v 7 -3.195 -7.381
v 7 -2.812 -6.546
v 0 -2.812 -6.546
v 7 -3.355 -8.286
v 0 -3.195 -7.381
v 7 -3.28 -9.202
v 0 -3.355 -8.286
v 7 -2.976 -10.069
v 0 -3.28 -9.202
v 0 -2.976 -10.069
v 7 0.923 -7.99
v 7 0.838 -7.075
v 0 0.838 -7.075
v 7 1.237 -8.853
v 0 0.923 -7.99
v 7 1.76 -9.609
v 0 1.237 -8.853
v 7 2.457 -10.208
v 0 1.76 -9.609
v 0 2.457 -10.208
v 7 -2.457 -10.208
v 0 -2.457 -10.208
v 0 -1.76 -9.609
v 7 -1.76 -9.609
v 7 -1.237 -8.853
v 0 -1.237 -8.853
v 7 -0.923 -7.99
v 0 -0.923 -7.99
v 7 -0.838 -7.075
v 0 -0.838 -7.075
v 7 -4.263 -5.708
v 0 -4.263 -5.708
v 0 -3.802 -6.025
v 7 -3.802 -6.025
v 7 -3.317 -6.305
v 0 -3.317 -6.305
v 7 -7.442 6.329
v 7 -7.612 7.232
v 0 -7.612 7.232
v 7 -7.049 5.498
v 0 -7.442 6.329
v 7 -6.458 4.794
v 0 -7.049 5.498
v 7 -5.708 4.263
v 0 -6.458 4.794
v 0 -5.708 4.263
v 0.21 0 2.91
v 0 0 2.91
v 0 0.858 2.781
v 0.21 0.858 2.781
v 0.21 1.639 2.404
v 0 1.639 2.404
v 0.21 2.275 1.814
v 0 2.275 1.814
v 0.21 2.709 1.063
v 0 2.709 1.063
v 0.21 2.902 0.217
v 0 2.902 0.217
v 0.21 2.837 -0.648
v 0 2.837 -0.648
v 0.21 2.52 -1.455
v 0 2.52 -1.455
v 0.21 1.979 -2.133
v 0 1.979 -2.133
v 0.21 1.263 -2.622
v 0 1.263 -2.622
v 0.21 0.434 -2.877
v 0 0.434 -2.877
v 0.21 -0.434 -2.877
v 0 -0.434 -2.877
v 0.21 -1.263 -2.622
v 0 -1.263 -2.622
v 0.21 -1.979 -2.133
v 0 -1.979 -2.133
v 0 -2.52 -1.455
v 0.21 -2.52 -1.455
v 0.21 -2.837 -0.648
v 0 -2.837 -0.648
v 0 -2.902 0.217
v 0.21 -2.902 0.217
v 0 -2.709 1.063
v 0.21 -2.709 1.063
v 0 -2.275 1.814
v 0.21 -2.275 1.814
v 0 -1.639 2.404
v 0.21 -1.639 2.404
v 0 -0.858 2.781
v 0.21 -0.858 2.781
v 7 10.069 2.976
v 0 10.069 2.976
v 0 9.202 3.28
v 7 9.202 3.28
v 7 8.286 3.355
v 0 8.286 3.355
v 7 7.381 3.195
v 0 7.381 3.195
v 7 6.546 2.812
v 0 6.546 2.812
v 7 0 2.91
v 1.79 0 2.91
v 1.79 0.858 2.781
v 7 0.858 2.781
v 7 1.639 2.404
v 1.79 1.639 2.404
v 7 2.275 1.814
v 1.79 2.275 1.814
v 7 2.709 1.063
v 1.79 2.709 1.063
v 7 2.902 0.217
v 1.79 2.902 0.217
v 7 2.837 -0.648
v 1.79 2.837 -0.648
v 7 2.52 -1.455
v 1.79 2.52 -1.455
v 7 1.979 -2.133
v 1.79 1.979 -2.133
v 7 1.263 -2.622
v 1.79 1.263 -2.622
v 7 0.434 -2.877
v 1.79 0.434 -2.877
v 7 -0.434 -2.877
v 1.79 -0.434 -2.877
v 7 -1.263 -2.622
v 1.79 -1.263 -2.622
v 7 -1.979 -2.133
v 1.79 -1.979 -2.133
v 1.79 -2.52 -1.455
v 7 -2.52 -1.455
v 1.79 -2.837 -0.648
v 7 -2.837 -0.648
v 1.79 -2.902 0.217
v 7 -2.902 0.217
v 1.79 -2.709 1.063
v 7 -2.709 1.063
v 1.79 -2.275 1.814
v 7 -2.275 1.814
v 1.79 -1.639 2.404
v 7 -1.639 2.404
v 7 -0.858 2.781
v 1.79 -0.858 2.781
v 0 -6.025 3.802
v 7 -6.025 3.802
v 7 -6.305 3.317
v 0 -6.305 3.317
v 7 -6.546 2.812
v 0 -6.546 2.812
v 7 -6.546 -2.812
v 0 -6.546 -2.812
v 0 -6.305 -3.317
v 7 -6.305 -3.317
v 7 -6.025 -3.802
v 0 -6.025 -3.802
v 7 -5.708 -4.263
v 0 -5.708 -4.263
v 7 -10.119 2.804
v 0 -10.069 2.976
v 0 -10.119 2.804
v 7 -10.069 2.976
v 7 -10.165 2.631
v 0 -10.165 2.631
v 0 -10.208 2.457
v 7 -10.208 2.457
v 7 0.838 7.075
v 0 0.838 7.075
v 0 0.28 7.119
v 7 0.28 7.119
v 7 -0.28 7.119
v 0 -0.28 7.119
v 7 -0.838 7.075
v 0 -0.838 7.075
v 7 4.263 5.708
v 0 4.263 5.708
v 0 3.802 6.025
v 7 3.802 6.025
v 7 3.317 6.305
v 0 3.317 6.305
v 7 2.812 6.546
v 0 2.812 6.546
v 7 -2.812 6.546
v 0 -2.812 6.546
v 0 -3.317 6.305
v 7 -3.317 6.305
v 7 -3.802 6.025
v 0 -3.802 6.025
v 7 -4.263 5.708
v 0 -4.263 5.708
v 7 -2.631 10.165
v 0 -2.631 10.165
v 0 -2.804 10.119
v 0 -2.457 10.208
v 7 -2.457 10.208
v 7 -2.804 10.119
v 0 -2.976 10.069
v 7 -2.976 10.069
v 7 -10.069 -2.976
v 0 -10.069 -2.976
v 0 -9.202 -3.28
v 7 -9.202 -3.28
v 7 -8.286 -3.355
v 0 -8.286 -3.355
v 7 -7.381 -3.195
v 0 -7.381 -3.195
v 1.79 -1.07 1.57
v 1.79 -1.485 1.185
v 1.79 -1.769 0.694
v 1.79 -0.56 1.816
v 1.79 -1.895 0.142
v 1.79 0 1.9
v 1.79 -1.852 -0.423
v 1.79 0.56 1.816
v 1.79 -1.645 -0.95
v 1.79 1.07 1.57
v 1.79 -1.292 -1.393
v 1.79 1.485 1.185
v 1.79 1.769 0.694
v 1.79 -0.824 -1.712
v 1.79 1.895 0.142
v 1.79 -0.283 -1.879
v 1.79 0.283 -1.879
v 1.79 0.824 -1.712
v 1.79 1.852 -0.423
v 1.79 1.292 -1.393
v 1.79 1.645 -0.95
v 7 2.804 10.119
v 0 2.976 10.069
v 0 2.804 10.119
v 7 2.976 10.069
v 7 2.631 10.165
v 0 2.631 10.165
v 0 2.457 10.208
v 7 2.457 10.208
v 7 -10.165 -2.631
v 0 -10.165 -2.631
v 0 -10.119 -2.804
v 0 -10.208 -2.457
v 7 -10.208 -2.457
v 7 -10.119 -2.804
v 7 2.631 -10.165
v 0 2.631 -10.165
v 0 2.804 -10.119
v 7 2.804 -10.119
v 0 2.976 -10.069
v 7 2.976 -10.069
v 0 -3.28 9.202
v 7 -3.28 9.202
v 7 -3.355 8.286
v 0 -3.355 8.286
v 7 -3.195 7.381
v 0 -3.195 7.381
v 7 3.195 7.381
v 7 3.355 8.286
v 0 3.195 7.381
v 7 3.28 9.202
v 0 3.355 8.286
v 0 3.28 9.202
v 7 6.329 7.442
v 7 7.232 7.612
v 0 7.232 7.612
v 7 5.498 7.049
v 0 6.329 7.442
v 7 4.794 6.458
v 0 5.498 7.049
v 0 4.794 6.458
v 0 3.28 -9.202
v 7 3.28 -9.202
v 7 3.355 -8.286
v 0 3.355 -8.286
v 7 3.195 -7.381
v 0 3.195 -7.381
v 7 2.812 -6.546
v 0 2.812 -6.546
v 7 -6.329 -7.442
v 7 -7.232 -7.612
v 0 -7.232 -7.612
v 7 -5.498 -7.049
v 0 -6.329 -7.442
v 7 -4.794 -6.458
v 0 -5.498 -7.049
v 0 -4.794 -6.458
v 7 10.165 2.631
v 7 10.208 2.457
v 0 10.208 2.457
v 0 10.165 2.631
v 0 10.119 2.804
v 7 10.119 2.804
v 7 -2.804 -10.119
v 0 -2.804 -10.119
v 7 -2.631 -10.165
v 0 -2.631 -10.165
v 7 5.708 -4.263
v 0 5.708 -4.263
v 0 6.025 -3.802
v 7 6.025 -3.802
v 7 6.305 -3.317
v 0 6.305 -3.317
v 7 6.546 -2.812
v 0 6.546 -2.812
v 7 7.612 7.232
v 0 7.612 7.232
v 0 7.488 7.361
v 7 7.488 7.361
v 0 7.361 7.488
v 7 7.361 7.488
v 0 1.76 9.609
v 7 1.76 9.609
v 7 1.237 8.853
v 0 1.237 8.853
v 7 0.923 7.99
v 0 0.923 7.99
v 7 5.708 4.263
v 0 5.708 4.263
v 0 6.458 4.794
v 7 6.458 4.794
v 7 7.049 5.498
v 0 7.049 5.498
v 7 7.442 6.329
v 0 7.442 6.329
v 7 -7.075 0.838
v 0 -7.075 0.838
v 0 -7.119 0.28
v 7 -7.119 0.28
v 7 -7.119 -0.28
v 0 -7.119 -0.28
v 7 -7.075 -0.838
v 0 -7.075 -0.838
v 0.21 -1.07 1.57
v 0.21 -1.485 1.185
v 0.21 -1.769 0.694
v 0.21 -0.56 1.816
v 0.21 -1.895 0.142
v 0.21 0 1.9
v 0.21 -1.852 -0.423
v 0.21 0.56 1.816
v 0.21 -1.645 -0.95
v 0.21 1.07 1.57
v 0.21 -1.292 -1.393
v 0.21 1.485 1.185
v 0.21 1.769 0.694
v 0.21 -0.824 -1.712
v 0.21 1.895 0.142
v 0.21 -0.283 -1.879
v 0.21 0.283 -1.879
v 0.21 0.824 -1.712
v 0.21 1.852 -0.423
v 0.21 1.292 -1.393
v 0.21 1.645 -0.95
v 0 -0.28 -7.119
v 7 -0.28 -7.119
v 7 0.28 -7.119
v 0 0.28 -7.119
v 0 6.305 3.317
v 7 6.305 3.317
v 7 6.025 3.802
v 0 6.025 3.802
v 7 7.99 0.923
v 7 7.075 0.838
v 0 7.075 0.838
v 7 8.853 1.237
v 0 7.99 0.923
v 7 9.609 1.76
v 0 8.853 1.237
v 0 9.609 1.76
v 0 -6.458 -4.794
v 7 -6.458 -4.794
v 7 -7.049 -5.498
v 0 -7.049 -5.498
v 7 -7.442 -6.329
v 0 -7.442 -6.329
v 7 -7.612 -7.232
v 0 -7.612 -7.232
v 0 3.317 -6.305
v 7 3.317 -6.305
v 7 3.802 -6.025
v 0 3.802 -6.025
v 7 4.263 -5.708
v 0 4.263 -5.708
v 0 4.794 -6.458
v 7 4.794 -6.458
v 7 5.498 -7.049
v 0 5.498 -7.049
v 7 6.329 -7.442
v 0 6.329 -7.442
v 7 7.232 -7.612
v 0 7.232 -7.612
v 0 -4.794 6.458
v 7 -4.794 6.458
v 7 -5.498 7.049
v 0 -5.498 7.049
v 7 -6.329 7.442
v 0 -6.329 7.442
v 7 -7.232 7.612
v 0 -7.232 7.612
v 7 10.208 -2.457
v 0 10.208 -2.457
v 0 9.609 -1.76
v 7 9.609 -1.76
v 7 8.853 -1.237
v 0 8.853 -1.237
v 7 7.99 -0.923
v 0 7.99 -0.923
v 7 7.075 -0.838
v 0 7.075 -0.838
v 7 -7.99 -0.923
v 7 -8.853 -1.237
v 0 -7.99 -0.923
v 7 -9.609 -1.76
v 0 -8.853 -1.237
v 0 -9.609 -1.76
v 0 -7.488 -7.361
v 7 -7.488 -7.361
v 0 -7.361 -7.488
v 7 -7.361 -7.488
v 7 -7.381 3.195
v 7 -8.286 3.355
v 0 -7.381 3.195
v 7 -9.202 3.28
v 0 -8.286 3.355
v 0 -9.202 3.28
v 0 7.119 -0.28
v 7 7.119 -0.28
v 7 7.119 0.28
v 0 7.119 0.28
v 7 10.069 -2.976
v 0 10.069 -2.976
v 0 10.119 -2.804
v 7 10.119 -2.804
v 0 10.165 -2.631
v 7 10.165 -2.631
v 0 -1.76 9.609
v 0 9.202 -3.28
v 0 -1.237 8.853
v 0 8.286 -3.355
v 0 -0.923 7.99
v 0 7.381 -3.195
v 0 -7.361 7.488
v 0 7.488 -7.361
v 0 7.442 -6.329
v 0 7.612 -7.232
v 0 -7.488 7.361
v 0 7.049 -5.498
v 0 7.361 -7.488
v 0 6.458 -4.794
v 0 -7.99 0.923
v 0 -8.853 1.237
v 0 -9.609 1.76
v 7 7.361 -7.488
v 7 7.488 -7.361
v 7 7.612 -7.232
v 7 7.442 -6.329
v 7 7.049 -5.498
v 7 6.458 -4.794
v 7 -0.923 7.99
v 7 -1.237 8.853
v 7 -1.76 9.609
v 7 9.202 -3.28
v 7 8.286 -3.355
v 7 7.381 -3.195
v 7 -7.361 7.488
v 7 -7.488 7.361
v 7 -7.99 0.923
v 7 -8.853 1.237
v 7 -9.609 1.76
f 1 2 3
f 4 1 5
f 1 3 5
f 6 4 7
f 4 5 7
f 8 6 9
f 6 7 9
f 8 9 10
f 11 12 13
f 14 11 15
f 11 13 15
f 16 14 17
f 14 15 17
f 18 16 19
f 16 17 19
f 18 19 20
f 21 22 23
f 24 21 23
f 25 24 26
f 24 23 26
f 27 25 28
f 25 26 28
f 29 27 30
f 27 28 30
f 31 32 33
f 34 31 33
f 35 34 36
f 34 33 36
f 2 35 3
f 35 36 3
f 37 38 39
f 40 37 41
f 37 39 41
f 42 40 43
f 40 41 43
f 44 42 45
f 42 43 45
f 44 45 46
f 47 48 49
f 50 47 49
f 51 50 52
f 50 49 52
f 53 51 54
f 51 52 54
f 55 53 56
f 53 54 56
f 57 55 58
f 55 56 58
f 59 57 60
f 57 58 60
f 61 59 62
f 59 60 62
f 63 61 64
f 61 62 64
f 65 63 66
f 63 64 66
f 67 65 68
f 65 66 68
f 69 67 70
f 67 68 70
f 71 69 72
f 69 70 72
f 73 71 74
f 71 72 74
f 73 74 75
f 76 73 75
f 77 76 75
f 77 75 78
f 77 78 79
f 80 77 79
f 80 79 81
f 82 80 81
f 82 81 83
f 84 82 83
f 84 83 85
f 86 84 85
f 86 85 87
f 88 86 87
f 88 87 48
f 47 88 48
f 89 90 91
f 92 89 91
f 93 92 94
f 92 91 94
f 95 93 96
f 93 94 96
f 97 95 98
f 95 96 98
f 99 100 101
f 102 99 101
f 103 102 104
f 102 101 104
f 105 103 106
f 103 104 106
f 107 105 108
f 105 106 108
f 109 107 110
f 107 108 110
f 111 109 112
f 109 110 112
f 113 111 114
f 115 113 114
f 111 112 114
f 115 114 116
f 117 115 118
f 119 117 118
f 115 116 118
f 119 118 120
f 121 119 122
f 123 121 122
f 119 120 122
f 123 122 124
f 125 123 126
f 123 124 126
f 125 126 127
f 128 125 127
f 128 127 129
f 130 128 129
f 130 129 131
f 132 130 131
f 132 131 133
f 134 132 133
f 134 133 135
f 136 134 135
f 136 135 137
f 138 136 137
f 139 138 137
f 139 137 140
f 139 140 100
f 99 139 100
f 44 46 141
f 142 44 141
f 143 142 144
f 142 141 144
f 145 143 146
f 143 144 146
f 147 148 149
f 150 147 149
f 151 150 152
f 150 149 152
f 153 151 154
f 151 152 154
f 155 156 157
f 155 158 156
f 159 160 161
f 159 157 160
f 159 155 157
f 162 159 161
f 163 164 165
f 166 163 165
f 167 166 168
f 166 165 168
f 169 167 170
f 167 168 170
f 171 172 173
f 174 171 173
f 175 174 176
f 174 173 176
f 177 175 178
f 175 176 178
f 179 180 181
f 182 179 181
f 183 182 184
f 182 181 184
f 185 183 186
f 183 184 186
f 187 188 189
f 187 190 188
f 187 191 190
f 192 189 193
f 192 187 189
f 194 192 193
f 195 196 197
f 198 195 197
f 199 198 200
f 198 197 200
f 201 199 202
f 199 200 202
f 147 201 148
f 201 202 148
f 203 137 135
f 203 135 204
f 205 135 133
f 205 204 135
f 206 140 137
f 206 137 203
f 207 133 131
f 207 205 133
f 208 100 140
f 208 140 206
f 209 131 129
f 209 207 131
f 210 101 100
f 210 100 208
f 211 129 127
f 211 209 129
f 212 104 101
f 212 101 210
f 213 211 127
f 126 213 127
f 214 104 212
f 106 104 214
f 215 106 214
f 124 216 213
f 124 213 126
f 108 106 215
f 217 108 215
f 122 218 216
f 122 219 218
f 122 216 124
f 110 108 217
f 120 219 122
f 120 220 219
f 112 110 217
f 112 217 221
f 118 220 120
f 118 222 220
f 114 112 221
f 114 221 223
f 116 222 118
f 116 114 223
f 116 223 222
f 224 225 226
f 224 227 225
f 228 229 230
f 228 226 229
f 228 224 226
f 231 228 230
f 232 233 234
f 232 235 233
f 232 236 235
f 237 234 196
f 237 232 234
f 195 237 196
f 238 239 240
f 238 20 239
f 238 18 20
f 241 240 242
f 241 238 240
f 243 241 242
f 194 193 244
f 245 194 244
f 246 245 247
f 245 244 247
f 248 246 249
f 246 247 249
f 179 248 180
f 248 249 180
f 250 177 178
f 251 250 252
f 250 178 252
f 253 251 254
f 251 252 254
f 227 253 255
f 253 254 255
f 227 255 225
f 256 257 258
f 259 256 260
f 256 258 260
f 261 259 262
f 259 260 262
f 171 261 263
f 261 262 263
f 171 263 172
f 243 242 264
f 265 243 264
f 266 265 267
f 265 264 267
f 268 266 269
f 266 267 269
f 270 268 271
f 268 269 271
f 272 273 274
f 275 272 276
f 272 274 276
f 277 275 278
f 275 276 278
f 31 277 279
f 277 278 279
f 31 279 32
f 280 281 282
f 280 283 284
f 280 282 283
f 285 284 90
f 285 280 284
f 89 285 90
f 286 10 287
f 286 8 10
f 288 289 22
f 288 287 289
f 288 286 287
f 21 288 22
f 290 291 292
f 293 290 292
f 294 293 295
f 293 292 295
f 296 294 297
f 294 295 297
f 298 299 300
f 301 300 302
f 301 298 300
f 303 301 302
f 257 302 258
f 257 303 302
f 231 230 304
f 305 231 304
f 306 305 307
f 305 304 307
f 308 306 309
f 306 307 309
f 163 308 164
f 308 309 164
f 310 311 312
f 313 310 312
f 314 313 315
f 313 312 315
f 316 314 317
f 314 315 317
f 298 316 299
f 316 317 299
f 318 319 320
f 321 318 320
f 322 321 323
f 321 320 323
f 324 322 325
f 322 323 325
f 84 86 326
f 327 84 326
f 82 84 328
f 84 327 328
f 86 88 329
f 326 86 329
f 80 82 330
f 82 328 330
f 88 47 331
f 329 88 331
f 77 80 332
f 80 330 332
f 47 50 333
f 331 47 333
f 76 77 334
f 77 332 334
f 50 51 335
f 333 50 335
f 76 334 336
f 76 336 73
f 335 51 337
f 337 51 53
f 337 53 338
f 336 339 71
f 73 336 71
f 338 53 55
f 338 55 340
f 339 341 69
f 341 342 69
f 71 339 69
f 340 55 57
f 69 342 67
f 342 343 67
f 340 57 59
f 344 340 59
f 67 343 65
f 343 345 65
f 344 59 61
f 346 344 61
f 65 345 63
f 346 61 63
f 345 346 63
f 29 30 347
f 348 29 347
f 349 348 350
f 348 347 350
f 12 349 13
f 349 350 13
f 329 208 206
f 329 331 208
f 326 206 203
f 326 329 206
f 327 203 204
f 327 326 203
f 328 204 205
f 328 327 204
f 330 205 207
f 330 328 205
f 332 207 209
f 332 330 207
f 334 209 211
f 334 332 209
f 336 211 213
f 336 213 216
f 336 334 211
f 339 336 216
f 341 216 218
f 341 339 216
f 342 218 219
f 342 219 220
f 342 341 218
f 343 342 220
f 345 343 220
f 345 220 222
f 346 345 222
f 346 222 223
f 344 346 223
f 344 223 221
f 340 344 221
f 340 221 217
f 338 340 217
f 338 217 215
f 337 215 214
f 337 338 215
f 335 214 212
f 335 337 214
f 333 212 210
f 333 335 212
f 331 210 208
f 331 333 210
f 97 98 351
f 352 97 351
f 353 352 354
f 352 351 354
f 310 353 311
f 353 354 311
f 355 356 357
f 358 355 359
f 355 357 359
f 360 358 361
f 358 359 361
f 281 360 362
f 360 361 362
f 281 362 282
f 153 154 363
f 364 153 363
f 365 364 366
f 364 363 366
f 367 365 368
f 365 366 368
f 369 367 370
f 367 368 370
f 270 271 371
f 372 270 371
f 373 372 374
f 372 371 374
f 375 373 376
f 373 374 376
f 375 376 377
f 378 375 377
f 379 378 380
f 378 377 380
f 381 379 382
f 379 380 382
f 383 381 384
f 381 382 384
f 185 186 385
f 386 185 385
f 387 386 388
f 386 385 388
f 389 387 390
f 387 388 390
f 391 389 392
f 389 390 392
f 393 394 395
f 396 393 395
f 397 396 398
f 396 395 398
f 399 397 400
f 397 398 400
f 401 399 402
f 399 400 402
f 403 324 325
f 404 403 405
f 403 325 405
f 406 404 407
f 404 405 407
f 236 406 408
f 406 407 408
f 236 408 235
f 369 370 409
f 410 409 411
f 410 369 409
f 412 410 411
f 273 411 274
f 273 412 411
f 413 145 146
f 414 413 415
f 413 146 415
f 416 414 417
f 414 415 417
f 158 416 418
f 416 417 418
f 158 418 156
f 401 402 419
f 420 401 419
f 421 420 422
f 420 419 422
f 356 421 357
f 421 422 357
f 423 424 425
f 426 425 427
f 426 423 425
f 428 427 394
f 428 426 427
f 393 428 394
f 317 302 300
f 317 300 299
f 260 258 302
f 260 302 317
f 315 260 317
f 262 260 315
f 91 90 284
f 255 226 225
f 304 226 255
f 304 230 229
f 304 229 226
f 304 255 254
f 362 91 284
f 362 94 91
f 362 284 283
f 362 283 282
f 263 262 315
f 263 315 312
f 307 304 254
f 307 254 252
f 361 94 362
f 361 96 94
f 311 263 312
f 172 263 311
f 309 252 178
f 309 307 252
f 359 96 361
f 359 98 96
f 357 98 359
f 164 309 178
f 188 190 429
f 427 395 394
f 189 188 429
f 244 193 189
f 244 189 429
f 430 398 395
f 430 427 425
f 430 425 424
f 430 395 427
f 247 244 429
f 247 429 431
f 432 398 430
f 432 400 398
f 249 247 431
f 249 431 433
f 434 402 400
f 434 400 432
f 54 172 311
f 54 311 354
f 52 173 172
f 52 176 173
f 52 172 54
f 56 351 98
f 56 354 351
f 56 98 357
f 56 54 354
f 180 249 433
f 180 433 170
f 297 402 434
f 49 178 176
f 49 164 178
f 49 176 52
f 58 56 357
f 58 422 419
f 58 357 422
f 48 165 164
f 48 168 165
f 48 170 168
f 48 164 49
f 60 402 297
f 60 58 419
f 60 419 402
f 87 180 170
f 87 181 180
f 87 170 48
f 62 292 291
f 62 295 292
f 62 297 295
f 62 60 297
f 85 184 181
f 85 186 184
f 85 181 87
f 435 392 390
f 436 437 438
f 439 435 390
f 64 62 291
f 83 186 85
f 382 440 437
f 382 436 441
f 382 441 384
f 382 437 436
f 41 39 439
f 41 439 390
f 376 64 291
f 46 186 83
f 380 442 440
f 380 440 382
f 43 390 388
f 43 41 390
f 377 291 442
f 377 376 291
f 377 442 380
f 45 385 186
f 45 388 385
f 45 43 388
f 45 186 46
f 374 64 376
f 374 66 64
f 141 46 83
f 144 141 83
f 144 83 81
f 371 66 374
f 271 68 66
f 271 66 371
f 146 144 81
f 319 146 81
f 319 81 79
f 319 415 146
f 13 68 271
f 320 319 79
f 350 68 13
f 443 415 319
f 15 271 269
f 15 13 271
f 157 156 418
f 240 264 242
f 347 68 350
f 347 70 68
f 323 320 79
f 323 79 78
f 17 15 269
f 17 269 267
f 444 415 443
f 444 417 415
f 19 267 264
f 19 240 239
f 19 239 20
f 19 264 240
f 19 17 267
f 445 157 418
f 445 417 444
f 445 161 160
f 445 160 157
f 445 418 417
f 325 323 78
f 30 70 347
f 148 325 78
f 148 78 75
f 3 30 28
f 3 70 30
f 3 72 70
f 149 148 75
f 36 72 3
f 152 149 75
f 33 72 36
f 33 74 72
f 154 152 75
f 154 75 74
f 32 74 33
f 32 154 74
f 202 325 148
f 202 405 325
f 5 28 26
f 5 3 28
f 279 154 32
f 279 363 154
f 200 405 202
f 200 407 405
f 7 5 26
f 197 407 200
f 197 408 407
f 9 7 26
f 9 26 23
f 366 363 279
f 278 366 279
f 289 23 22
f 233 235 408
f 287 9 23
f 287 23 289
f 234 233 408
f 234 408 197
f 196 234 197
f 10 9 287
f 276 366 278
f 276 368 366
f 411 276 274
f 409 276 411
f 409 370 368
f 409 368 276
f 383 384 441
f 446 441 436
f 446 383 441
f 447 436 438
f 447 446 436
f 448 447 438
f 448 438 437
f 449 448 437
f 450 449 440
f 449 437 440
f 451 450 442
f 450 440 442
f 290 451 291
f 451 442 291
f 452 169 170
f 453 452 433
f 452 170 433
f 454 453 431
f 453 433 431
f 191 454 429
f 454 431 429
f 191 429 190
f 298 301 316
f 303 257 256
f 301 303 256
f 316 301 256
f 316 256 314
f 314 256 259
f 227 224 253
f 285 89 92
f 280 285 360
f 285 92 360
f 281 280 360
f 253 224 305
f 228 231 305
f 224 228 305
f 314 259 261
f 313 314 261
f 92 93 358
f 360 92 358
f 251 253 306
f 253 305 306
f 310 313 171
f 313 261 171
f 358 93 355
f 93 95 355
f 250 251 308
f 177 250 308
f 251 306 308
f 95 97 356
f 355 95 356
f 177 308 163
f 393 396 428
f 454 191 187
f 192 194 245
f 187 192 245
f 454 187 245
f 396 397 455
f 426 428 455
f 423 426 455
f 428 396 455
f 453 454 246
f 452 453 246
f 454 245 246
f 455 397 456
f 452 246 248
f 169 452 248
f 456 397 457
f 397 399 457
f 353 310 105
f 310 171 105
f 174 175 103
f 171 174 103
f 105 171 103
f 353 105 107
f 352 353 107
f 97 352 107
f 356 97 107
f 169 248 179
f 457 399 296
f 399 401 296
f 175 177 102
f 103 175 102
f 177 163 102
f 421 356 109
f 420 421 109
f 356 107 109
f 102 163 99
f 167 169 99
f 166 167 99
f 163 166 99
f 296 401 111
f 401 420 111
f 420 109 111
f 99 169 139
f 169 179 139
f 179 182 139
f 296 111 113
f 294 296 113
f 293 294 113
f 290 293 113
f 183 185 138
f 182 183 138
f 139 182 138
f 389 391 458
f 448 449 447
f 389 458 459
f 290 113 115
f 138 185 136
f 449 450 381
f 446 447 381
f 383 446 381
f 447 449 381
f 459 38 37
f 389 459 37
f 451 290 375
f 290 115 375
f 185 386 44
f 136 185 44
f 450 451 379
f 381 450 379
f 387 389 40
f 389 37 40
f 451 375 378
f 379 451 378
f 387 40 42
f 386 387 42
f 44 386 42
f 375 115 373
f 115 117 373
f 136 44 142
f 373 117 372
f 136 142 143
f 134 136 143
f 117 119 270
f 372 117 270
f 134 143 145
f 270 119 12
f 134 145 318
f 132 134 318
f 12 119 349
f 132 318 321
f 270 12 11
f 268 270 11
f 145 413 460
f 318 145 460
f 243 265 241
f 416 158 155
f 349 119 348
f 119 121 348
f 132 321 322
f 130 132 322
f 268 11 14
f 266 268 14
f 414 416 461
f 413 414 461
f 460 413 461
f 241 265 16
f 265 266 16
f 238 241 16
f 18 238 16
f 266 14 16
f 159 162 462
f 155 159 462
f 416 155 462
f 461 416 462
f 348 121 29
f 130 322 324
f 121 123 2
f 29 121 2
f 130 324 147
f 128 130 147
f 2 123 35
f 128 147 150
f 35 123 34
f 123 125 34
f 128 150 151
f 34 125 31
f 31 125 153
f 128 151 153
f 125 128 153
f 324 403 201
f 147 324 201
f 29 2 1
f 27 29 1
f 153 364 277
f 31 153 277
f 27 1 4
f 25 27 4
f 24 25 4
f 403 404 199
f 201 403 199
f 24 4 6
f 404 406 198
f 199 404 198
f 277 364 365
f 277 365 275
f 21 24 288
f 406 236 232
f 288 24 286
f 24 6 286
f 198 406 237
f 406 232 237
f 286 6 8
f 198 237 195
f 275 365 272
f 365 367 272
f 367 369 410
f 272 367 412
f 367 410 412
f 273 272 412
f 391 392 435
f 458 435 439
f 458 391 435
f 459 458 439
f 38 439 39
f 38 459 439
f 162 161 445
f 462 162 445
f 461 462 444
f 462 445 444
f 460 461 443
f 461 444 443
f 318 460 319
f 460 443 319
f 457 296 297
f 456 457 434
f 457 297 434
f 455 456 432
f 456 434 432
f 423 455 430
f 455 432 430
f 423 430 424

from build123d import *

# Parameters (mm, degrees)
BASPROSKE_W             = 7
BASPROSKE_H             = 10.5
TOOTHCUT_DEPTH          = 17.416455159
TEETHCUTS_COUNT         = 12
TEETHCUTS_ANGLE         = 330
BORSKE_R                = 2.5
BORE_DEPTH              = 50.0000508
CROQUIS2_R              = 2.91
CORTAR_EXTRUIR1_DEPTH   = 11
CROQUIS3_R              = 3.252376505
CROQUIS3_R_2            = 1.9
SALIENTE_EXTRUIR2_DEPTH = 0.79


with BuildPart() as part:
    # BasProSke → Base-Revolve (revolve)
    with BuildSketch(Plane(origin=(0, 0, 0), x_dir=(1, 0, 0), z_dir=(0, 1, 0)), mode=Mode.PRIVATE) as base_revolve_sk:
        with Locations((3.5, 5.25)):
            Rectangle(BASPROSKE_W, BASPROSKE_H)
    revolve(base_revolve_sk.sketch.rotate(Axis((-10, 0, 0), (1, 0, 0)), 180), axis=Axis((-10, 0, 0), (1, 0, 0)))

    # TooCutSke → ToothCut (cut, through all)
    with BuildSketch(Plane(origin=(0, 0, 0), x_dir=(0, 0, -1), z_dir=(1, 0, 0))):
        with BuildLine():
            ThreePointArc((0.837751456, 7.074570552), (0, 7.124), (-0.837751456, 7.074570552))
            ThreePointArc((-0.837751456, 7.074570552), (-1.245380016, 8.868946541), (-2.486473743, 10.227487154))
            ThreePointArc((-2.486473743, 10.227487154), (0, 10.5254), (2.486473743, 10.227487154))
            ThreePointArc((2.486473743, 10.227487154), (1.245380016, 8.868946541), (0.837751456, 7.074570552))
        make_face()
    toothcut = extrude(amount=TOOTHCUT_DEPTH, mode=Mode.SUBTRACT)

    # TeethCuts: ToothCut ×12 about axis
    teethcuts_axis = Axis((-10, 0, 0), (1, 0, 0))
    for i in range(1, TEETHCUTS_COUNT):
        add(toothcut.rotate(teethcuts_axis, i * TEETHCUTS_ANGLE / (TEETHCUTS_COUNT - 1)), mode=Mode.SUBTRACT)

    # BorSke → Bore (cut, symmetric)
    with BuildSketch(Plane(origin=(0, 0, 0), x_dir=(0, 0, -1), z_dir=(1, 0, 0))):
        with Locations(Location((0, 0, 0), (0, 0, 180))):
            Circle(BORSKE_R)
    extrude(amount=BORE_DEPTH, both=True, mode=Mode.SUBTRACT)

    # Croquis2 → Cortar-Extruir1 (cut)
    with BuildSketch(Plane.ZY):
        Circle(CROQUIS2_R)
    extrude(amount=-CORTAR_EXTRUIR1_DEPTH, mode=Mode.SUBTRACT)

    # Croquis3 → Saliente-Extruir2 (add, symmetric)
    with BuildSketch(Plane(origin=(1, 0, 0), x_dir=(0, 0, -1), z_dir=(1, 0, 0))):
        Circle(CROQUIS3_R)
        with Locations(Location((0, 0, 0), (0, 0, 180))):
            Circle(CROQUIS3_R_2, mode=Mode.SUBTRACT)
    extrude(amount=SALIENTE_EXTRUIR2_DEPTH, both=True)


solid = part.part
